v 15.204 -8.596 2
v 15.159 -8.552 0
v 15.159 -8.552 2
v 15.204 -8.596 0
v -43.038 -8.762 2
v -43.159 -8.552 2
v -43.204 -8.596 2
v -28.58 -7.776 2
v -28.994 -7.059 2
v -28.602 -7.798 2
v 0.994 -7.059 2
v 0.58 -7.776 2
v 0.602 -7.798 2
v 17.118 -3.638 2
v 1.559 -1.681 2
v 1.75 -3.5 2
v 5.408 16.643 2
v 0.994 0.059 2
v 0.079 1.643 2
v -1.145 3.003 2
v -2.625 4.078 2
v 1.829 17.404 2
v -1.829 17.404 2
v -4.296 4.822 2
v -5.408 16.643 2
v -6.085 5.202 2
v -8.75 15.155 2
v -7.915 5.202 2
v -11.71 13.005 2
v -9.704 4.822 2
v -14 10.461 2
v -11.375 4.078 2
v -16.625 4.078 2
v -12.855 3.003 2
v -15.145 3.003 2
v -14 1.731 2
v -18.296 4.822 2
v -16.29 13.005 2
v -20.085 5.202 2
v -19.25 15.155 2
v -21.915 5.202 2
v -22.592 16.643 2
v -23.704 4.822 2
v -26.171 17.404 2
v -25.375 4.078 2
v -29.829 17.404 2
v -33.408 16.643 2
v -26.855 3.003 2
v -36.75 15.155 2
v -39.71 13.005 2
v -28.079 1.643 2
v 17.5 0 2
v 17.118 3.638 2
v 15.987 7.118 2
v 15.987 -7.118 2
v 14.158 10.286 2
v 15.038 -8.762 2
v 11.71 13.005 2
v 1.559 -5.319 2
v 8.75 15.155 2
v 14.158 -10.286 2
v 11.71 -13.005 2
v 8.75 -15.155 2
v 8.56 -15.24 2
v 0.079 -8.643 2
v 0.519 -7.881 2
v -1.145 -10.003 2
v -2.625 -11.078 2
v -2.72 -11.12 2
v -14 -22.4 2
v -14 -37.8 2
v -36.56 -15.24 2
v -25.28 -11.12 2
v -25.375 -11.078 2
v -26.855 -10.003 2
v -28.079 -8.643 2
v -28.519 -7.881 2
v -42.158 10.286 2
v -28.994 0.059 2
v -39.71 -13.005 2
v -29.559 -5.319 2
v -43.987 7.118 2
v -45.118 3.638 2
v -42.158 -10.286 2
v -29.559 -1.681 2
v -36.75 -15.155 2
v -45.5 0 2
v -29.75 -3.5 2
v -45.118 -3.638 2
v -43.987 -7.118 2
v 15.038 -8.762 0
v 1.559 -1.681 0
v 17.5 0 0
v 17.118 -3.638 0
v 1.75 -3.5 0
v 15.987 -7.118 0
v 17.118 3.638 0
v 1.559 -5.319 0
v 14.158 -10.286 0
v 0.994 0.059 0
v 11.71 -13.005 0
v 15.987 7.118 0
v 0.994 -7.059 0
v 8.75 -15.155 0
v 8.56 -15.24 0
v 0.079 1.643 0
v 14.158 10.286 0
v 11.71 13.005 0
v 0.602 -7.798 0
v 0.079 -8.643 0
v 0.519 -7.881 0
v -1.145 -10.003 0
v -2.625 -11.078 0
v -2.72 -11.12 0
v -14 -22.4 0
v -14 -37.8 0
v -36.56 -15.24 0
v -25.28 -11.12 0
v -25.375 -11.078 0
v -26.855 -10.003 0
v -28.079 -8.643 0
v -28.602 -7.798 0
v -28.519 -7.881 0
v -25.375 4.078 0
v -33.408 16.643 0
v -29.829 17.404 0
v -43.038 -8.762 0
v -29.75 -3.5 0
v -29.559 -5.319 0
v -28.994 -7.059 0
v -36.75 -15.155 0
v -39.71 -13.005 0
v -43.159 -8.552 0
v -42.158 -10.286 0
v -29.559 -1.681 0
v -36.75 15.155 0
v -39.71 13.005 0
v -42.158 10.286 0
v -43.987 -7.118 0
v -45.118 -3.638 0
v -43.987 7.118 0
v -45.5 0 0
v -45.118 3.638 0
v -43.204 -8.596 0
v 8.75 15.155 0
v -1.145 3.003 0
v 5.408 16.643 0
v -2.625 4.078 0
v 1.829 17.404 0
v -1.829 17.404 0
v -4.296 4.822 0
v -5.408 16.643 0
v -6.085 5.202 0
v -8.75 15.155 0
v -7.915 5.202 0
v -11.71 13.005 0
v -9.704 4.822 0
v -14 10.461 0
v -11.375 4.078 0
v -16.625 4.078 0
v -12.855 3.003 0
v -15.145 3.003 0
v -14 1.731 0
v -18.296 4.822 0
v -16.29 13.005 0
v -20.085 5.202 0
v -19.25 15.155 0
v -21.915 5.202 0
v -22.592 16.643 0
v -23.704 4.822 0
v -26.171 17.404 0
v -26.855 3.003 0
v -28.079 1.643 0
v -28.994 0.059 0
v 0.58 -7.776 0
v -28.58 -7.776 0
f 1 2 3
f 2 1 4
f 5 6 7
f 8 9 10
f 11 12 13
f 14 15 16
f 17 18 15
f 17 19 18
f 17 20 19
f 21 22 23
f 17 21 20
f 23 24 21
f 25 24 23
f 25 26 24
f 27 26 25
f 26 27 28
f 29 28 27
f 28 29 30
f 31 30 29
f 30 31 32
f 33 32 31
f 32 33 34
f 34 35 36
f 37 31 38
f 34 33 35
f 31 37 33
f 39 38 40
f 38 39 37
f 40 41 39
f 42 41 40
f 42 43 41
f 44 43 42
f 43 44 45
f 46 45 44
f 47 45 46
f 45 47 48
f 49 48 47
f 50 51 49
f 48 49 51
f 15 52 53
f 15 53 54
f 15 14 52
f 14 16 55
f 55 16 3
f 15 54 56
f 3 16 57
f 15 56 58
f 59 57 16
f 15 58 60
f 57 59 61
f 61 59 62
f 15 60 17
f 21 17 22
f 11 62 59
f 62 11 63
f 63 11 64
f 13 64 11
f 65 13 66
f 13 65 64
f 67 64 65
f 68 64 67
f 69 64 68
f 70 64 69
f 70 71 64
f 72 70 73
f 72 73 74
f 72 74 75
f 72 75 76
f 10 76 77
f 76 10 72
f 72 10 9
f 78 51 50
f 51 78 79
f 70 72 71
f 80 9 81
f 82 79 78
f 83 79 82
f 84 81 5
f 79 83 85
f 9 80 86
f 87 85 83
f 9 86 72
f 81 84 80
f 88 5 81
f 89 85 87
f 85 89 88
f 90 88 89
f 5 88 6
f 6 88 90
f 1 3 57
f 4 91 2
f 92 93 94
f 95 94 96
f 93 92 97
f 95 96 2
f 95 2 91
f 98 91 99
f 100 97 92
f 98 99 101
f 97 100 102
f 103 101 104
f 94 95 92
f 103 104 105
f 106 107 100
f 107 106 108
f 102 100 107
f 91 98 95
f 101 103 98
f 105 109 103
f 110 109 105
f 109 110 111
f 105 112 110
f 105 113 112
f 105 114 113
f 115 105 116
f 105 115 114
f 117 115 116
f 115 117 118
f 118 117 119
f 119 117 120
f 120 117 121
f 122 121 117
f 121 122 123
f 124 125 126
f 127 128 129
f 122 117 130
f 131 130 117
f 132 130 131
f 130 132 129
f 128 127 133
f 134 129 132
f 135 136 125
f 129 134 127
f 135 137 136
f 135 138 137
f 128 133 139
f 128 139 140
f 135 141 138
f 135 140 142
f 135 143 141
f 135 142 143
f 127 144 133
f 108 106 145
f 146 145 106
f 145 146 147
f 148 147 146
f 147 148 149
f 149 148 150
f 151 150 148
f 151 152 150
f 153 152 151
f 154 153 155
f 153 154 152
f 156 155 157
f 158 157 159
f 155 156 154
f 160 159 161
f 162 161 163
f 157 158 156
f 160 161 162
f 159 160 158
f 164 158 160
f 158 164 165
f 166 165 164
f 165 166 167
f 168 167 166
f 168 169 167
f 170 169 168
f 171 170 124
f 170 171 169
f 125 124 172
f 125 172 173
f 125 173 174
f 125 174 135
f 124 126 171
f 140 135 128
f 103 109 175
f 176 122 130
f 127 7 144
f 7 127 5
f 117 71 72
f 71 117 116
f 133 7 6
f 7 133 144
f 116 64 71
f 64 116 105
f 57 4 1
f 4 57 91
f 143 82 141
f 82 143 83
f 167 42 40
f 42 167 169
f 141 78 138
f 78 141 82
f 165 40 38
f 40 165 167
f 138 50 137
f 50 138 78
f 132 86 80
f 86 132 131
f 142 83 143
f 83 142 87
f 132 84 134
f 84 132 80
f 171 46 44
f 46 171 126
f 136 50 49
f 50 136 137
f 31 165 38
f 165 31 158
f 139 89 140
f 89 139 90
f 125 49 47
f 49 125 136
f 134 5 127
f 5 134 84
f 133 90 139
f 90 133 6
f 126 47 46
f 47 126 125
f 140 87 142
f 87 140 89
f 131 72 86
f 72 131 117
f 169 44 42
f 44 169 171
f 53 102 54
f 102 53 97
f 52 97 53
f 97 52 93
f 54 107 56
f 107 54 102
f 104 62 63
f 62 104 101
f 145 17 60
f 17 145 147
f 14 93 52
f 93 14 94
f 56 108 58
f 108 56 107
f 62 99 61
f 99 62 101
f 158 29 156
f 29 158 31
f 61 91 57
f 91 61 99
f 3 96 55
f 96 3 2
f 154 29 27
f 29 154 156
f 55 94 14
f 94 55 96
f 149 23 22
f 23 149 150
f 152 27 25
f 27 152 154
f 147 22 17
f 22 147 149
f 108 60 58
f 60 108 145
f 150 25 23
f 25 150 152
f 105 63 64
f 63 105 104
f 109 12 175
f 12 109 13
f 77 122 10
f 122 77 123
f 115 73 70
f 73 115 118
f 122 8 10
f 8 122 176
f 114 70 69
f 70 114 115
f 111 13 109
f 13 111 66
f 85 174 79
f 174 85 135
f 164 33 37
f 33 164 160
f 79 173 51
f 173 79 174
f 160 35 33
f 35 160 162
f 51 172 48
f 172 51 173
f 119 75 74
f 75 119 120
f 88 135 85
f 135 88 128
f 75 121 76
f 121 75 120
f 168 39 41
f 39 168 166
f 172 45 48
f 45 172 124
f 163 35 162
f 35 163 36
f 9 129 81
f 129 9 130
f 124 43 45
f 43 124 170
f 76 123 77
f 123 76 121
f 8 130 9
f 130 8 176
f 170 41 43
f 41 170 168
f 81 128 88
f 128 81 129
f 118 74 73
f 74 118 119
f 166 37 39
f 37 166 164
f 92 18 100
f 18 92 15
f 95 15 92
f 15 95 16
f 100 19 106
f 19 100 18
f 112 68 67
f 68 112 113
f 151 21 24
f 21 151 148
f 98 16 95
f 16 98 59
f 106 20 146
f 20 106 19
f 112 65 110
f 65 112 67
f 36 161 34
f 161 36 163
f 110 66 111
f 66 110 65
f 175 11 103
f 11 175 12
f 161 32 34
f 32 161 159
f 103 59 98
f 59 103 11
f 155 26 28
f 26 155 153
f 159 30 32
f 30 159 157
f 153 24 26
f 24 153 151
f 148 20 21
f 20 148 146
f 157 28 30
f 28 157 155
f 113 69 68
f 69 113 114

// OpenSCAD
 scale([0.7,0.7,1])
  difference(){
  difference(){
  union(){
	translate([-40,0,0]) cylinder(2,25,25);
    cylinder(2,25,25);

 	translate([-20,-54,0]) rotate([0,0,45]) 
  difference(){
 	cube([59,59,2]);
  	translate([45,45,-1]) cube([20,20,4]);
}
}
}
 	translate([-10,-5,0])
  	scale([0.5,0.5,1])
 difference(){
  union(){
  	translate([-40,0,-1]) cylinder(4,25,25);
   	translate([0,0,-1]) cylinder(4,25,25);
	translate([-20,-54,0]) rotate([0,0,45]) 

 difference(){
 	translate([0,0,-1]) cube([59,59,4]);
	translate([45,45,-1]) cube([20,20,4]);
}
}
}
}
